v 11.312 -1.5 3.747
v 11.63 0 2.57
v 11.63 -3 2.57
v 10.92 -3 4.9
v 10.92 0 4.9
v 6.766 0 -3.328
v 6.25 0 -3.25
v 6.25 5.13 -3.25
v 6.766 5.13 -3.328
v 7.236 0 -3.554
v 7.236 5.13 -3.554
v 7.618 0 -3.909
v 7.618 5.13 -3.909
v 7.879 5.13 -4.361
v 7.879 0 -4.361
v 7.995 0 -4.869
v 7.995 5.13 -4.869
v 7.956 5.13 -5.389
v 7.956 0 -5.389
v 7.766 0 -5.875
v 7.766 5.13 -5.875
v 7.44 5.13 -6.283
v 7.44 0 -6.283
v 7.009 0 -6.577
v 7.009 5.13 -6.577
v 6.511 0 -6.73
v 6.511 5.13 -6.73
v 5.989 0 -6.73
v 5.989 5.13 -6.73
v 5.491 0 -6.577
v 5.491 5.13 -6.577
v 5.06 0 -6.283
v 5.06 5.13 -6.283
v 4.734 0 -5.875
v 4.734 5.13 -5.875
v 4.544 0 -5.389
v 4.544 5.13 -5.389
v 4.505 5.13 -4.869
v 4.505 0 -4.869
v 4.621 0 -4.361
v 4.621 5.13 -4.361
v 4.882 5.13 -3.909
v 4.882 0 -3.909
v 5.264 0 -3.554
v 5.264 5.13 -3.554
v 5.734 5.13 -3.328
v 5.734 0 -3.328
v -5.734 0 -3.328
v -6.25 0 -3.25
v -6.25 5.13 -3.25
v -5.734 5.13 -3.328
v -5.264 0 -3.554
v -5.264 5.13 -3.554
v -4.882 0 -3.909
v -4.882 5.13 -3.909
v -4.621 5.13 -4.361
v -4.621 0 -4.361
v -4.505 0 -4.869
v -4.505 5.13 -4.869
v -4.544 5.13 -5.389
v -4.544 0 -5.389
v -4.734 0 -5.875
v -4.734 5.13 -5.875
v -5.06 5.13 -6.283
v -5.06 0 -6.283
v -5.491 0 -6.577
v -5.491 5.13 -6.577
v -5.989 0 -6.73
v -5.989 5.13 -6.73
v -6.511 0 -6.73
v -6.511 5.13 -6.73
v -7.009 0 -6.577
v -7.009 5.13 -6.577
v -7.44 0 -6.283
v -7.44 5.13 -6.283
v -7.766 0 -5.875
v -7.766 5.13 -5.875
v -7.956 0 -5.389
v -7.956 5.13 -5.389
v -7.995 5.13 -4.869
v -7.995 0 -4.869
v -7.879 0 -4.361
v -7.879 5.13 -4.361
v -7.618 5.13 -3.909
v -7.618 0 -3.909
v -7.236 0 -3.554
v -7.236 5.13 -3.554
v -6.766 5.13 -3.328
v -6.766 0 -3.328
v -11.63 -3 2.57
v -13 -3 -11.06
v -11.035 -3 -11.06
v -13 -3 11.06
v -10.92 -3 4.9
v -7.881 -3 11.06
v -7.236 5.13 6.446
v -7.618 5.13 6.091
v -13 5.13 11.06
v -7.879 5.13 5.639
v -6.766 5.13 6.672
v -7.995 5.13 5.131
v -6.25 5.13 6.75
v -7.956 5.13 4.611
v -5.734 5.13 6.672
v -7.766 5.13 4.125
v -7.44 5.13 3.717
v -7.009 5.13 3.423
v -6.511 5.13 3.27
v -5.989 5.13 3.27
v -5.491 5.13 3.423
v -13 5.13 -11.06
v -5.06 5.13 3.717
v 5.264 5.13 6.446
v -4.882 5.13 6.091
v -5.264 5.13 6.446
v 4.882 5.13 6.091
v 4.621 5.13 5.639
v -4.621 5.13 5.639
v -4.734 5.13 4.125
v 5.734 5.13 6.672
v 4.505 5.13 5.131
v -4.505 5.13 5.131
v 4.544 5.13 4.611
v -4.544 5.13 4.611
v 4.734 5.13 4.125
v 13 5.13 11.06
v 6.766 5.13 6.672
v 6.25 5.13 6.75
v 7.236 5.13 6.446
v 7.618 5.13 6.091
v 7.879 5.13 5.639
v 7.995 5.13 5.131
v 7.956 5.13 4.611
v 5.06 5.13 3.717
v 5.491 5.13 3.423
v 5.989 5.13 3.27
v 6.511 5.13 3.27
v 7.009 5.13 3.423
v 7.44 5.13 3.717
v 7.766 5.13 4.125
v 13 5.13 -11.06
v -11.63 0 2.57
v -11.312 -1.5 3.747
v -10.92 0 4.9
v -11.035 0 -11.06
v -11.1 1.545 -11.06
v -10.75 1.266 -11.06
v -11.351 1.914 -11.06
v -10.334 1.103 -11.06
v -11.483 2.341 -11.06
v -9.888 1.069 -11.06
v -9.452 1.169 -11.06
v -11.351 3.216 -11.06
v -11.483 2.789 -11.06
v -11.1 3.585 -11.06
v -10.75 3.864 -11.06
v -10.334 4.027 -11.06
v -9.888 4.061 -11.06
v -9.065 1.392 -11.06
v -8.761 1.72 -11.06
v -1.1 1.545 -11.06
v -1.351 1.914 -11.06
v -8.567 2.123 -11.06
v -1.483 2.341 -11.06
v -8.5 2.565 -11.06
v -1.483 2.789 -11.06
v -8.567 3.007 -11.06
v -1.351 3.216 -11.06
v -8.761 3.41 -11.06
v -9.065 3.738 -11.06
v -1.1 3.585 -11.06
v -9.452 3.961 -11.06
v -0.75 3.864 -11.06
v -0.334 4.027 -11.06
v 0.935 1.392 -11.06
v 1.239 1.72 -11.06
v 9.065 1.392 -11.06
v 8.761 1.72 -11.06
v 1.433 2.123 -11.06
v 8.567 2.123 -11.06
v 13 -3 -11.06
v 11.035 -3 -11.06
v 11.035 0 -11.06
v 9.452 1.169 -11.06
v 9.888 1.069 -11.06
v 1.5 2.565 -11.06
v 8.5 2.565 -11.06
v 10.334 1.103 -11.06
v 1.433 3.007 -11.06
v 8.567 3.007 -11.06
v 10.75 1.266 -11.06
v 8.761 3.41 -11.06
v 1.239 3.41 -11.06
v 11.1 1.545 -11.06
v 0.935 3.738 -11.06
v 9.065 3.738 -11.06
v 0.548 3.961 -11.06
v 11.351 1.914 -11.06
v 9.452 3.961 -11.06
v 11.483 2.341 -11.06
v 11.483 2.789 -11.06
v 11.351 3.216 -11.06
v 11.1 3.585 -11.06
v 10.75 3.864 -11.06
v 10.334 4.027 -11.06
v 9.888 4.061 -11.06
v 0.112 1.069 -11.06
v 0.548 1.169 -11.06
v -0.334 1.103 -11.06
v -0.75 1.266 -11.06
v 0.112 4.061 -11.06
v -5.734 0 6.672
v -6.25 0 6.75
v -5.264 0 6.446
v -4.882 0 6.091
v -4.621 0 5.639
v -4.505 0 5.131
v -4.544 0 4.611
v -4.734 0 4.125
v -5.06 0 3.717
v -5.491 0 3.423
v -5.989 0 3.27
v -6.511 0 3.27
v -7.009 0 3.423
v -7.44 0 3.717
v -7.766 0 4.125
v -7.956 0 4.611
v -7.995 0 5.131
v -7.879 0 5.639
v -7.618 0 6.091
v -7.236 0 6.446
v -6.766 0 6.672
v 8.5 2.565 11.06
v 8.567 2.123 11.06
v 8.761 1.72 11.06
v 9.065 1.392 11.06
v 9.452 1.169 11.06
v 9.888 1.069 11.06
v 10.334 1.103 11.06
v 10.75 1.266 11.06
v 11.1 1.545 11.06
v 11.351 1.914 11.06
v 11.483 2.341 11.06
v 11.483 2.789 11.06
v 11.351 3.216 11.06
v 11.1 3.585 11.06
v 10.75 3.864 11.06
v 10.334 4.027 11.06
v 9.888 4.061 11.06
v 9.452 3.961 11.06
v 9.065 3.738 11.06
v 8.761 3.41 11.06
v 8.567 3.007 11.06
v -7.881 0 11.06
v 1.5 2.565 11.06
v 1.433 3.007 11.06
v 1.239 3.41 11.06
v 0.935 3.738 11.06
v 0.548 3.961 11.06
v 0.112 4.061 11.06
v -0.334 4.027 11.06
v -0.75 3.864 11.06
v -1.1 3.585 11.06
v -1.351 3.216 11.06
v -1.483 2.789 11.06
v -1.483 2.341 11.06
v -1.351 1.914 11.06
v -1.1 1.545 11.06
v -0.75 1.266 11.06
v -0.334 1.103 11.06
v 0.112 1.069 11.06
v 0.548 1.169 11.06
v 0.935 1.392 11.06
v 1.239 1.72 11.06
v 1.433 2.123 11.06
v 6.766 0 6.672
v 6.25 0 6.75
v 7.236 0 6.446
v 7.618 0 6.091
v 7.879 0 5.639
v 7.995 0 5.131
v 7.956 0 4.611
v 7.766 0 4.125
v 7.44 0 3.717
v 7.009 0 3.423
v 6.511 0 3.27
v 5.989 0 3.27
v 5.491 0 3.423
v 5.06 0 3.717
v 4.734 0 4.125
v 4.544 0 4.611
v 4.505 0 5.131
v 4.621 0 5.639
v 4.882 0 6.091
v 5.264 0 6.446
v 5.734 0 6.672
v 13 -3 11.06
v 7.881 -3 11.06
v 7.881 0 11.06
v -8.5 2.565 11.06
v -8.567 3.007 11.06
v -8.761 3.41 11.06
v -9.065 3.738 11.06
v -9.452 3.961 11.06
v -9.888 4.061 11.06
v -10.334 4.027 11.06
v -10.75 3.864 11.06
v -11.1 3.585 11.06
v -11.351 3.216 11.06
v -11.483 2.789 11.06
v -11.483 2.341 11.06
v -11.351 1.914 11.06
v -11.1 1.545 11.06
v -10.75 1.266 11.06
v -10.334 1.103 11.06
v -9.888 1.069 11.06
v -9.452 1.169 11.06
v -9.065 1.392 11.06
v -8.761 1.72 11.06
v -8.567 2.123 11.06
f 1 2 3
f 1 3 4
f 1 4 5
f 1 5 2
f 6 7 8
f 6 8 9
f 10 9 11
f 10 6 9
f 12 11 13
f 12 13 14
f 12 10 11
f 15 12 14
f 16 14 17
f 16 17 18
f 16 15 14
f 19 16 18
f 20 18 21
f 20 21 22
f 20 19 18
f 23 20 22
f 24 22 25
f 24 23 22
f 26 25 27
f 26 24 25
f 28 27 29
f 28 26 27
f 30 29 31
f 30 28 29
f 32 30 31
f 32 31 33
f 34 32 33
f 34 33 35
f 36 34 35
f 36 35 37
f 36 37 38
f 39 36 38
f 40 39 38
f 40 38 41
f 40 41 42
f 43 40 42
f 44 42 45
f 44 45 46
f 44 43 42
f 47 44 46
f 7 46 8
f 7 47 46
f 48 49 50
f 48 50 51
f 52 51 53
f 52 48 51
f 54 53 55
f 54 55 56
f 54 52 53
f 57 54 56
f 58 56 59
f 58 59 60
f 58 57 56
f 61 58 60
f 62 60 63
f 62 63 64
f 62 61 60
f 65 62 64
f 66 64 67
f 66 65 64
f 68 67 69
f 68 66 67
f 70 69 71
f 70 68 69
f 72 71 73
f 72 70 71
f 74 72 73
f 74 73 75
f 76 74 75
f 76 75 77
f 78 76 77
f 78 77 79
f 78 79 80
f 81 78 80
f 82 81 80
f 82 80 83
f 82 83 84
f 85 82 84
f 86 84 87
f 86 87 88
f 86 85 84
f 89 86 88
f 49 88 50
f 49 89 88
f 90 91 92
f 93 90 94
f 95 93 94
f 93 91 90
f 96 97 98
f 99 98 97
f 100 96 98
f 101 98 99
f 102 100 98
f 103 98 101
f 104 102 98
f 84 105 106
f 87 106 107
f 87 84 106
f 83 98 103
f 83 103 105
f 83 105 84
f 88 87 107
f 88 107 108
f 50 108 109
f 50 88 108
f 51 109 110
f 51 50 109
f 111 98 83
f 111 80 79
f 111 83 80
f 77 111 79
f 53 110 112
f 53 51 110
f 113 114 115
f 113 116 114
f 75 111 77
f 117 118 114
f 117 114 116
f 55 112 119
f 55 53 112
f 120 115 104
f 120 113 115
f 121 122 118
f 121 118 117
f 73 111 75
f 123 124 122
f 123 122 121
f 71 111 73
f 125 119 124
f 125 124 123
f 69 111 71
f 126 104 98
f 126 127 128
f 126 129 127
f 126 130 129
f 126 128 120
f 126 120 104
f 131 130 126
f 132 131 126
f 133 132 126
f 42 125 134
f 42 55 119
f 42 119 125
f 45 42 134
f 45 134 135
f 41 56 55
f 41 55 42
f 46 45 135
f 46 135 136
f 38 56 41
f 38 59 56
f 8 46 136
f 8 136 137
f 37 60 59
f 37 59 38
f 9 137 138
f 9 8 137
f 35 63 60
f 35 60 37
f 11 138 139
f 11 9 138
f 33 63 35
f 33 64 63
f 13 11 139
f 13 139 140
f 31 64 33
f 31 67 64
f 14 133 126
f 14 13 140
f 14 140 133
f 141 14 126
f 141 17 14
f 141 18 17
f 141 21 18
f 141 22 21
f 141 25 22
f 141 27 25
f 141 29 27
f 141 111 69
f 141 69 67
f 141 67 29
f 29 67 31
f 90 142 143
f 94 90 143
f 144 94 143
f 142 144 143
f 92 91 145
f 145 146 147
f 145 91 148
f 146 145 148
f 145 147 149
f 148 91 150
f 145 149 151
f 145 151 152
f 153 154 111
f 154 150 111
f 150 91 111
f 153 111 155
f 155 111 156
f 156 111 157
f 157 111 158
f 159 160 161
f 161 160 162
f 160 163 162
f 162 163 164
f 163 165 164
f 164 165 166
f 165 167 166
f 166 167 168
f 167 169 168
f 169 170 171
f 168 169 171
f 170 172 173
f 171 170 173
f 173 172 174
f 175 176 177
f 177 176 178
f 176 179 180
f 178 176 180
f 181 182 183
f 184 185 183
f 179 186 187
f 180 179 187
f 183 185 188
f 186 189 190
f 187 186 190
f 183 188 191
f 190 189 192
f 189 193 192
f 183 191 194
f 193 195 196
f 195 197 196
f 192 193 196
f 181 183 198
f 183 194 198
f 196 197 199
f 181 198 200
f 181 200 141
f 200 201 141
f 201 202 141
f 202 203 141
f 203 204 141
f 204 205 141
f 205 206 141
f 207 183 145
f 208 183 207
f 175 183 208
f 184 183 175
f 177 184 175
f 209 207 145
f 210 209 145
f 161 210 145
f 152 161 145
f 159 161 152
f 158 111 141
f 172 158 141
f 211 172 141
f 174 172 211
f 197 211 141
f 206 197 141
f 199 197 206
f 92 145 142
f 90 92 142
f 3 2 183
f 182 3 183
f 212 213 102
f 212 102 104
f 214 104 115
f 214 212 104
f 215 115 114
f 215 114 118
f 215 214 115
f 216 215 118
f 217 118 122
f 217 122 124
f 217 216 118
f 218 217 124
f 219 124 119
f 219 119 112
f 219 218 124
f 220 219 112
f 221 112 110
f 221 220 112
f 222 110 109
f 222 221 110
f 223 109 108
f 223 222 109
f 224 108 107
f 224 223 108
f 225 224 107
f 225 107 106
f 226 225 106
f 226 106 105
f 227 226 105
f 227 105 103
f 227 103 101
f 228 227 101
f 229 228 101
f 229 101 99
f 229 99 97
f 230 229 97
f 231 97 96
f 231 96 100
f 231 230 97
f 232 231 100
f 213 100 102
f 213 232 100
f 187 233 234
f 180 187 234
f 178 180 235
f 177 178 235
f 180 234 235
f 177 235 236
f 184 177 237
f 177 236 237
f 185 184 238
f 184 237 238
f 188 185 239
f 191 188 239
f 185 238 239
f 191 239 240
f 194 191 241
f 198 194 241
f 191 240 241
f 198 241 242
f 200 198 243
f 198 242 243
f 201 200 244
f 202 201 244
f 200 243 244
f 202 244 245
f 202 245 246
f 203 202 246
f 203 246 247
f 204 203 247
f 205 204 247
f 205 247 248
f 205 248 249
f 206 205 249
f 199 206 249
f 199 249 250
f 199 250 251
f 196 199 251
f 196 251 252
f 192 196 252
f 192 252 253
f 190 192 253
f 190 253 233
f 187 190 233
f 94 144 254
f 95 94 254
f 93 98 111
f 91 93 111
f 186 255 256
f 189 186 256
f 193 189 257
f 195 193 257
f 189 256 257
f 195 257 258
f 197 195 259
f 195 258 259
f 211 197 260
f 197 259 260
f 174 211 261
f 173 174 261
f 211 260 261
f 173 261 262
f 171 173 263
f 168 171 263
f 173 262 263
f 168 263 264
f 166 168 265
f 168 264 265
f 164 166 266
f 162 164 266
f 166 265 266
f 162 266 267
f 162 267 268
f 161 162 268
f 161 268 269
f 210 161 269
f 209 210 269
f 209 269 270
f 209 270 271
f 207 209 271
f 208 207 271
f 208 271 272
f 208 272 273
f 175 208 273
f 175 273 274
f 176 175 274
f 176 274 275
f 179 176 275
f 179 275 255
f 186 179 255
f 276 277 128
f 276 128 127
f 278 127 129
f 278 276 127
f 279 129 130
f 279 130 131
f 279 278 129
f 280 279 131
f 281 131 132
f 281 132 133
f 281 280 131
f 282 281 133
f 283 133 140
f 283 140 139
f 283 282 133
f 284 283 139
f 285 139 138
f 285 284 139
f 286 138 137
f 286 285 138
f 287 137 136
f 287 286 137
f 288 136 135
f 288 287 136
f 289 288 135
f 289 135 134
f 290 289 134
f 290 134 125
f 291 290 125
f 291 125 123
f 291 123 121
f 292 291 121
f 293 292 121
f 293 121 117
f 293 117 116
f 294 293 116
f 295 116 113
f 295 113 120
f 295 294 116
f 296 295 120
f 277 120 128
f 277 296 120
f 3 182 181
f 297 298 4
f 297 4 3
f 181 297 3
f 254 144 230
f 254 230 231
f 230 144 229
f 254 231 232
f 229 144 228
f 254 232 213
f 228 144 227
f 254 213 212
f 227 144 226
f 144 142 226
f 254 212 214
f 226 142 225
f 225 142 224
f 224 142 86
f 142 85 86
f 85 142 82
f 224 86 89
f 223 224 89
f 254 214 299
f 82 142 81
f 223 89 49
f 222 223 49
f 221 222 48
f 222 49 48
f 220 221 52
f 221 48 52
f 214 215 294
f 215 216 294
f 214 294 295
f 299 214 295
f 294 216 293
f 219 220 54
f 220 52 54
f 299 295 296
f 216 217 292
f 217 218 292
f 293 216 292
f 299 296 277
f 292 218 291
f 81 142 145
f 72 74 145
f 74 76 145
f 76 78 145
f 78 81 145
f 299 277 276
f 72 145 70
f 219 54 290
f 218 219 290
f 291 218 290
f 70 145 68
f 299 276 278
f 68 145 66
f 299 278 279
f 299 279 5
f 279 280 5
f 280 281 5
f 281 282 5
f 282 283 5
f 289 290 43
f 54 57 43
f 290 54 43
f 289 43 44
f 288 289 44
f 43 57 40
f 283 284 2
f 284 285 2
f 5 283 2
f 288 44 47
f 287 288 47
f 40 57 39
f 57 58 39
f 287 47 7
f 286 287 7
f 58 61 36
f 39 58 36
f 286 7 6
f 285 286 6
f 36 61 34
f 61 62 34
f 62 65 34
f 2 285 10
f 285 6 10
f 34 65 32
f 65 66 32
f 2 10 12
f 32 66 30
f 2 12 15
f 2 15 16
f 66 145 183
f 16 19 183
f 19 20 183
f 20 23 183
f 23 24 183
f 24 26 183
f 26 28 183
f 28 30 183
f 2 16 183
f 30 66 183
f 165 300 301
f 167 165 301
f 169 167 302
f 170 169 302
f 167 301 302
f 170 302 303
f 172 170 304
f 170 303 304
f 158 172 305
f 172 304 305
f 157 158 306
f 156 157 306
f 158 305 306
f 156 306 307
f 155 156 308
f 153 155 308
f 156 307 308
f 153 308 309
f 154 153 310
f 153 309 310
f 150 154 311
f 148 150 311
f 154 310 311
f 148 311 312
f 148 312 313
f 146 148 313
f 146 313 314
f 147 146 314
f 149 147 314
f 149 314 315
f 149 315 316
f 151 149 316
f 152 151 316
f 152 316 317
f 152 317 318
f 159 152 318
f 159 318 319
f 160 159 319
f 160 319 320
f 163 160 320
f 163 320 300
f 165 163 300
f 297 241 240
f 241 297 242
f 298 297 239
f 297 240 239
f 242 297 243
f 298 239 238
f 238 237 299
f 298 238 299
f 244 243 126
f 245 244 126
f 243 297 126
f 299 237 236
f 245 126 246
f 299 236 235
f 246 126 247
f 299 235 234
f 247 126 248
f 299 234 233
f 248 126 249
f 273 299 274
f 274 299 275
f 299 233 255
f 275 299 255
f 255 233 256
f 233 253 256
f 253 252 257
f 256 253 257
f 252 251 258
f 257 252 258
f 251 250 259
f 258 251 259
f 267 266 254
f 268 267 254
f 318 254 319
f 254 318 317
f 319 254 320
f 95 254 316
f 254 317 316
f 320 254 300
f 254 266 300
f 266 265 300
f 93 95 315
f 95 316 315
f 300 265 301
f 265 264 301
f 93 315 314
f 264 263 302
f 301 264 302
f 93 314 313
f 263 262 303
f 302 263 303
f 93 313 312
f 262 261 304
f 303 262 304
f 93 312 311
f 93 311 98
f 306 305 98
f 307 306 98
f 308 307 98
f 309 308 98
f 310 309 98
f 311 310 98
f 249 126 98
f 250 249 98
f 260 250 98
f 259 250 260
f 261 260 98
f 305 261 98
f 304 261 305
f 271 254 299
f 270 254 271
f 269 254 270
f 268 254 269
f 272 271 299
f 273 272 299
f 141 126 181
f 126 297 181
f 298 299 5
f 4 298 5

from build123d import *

# Parameters (mm, degrees)
SKETCH1_W           = 26
SKETCH1_H           = 22.12
SKETCH1_R           = 1.75
BOSS_EXTRUDE1_DEPTH = 5.13
CUT_EXTRUDE1_REACH  = 28.165
SKETCH2_R           = 1.5
BOSS_EXTRUDE2_DEPTH = 3


with BuildPart() as part:
    # Sketch1 → Boss-Extrude1 (new body)
    with BuildSketch(Plane(origin=(0, 0, 0), x_dir=(1, 0, 0), z_dir=(0, 1, 0))):
        Rectangle(SKETCH1_W, SKETCH1_H)
        with Locations((-6.25, -5)):
            Circle(SKETCH1_R, mode=Mode.SUBTRACT)
        with Locations((6.25, -5)):
            Circle(SKETCH1_R, mode=Mode.SUBTRACT)
        with Locations((-6.25, 5)):
            Circle(SKETCH1_R, mode=Mode.SUBTRACT)
        with Locations((6.25, 5)):
            Circle(SKETCH1_R, mode=Mode.SUBTRACT)
    extrude(amount=BOSS_EXTRUDE1_DEPTH)

    # Sketch2 → Cut-Extrude1 (cut, up to next)
    with BuildSketch(Plane.XY.offset(11.06), mode=Mode.PRIVATE) as cut_extrude1_sk1:
        with Locations((0, 2.565)):
            Circle(SKETCH2_R)
    cut_extrude1_tool1 = extrude(cut_extrude1_sk1.sketch, amount=-CUT_EXTRUDE1_REACH, mode=Mode.PRIVATE) & part.part
    # Sketch2 → Cut-Extrude1 (cut, up to next)
    with BuildSketch(Plane.XY.offset(11.06), mode=Mode.PRIVATE) as cut_extrude1_sk2:
        with Locations((-10, 2.565)):
            Circle(SKETCH2_R)
    cut_extrude1_tool2 = extrude(cut_extrude1_sk2.sketch, amount=-CUT_EXTRUDE1_REACH, mode=Mode.PRIVATE) & part.part
    # Sketch2 → Cut-Extrude1 (cut, up to next)
    with BuildSketch(Plane.XY.offset(11.06), mode=Mode.PRIVATE) as cut_extrude1_sk3:
        with Locations((10, 2.565)):
            Circle(SKETCH2_R)
    cut_extrude1_tool3 = extrude(cut_extrude1_sk3.sketch, amount=-CUT_EXTRUDE1_REACH, mode=Mode.PRIVATE) & part.part
    add(cut_extrude1_tool1.solids().sort_by_distance((0, 2.565, 11.06))[0], mode=Mode.SUBTRACT)
    add(cut_extrude1_tool2.solids().sort_by_distance((-10, 2.565, 11.06))[0], mode=Mode.SUBTRACT)
    add(cut_extrude1_tool3.solids().sort_by_distance((10, 2.565, 11.06))[0], mode=Mode.SUBTRACT)

    # Sketch3 → Boss-Extrude2 (add)
    with BuildSketch(Plane.XZ):
        with BuildLine():
            Line((-13, -11.06), (-11.035, -11.06))
            Line((-11.035, -11.06), (-11.63, 2.57))
            add(Edge.make_bspline(
                [(-11.63, 2.57), (-11.34945273, 3.758467492), (-10.92, 4.9)],
                knots=[0, 0, 0, 1, 1, 1], degree=2))
            Line((-10.92, 4.9), (-7.881497006, 11.06))
            Line((-7.881497006, 11.06), (-13, 11.06))
            Line((-13, 11.06), (-13, -11.06))
        make_face()
        with BuildLine():
            Line((11.63, 2.57), (11.035, -11.06))
            Line((11.035, -11.06), (13, -11.06))
            Line((13, -11.06), (13, 11.06))
            Line((13, 11.06), (7.881497006, 11.06))
            Line((7.881497006, 11.06), (10.92, 4.9))
            add(Edge.make_bspline(
                [(11.63, 2.57), (11.34945273, 3.758467492), (10.92, 4.9)],
                knots=[0, 0, 0, 1, 1, 1], degree=2))
        make_face()
    extrude(amount=BOSS_EXTRUDE2_DEPTH)


solid = part.part
